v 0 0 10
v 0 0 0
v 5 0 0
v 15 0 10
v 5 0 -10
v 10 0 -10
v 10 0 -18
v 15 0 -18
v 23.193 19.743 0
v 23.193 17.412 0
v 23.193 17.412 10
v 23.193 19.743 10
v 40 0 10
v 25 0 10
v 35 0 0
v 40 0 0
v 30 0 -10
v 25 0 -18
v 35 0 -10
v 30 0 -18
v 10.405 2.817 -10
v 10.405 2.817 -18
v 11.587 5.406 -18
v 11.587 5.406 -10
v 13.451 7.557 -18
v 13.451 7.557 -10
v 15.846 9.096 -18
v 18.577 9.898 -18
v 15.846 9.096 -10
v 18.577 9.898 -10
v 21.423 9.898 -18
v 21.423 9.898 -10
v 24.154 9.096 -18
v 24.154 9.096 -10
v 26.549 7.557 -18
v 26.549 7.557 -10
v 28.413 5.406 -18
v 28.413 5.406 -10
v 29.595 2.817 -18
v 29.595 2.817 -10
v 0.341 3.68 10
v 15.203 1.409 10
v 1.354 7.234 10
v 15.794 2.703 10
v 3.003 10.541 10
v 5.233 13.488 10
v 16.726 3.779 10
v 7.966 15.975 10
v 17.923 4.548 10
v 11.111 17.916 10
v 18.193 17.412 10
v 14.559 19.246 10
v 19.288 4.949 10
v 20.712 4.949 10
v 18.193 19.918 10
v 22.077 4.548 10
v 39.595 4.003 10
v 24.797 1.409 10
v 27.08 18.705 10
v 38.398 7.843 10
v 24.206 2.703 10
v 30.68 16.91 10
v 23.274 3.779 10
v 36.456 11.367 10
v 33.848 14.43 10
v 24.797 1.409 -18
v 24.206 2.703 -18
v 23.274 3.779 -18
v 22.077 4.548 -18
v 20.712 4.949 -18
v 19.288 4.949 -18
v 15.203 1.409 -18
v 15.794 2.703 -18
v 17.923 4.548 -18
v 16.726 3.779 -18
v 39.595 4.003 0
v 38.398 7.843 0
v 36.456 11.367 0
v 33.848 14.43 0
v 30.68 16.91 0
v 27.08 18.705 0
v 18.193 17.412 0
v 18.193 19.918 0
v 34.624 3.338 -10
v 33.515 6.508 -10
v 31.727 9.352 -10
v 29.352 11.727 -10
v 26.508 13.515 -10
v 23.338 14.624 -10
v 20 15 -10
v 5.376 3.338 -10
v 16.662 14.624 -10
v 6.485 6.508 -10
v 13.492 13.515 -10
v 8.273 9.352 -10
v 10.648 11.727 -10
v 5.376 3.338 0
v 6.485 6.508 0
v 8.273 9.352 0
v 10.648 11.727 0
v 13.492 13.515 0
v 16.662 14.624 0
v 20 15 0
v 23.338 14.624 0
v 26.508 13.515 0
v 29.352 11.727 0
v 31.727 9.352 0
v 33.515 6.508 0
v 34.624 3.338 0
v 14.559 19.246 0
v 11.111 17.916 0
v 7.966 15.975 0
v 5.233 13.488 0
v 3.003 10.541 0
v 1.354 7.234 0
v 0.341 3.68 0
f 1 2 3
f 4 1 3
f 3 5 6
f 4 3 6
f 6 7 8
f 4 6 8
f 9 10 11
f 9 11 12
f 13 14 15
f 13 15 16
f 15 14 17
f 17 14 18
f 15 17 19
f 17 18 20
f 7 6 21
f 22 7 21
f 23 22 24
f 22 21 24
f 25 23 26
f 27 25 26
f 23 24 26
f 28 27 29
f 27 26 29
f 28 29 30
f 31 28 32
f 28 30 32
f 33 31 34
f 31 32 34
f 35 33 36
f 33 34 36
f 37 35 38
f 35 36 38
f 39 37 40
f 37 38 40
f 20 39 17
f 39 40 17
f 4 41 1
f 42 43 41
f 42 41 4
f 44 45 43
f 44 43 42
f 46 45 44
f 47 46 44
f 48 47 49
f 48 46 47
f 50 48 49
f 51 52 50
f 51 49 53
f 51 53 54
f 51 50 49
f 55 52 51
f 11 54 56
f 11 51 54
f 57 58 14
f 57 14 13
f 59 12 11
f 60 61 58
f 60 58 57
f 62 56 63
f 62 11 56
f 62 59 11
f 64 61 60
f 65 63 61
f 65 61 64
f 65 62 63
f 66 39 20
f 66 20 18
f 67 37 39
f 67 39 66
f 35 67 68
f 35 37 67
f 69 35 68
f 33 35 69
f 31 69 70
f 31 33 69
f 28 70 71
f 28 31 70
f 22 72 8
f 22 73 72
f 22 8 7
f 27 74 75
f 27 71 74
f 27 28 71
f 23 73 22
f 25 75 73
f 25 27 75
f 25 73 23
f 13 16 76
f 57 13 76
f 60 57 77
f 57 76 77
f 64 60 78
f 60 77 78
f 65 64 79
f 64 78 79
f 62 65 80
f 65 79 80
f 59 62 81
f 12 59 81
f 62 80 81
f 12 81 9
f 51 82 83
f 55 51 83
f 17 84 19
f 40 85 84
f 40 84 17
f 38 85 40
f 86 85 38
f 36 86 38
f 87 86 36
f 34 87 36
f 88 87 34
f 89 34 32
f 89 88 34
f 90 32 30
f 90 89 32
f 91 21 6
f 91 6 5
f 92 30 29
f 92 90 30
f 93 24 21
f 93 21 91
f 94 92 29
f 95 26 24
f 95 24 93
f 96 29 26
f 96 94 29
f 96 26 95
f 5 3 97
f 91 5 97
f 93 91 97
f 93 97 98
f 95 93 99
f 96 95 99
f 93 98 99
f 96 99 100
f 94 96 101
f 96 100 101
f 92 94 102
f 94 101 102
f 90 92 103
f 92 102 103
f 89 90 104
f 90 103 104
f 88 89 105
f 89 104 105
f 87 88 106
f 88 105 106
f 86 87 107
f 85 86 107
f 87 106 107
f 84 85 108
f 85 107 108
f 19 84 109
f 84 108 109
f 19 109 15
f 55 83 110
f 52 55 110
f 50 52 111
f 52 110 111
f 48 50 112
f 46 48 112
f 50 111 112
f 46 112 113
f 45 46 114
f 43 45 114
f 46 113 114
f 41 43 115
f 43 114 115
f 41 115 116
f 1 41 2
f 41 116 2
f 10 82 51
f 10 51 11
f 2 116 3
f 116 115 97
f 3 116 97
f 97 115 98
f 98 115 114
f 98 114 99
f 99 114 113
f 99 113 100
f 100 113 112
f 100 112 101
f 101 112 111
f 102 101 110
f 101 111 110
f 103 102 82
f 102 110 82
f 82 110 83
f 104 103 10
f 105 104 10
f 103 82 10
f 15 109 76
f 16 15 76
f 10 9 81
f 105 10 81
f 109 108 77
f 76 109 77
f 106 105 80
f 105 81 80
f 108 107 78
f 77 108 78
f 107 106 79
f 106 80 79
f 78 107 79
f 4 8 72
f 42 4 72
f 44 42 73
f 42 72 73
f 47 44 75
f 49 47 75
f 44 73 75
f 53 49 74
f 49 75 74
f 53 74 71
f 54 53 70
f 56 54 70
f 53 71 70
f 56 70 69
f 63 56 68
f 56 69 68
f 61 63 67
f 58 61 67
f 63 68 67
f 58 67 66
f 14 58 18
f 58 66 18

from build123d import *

# Parameters (mm, degrees)
BOSS_EXTRUDE1_DEPTH     = 10
CUT_EXTRUDE1_DEPTH      = 12
CUT_EXTRUDE1_DEPTH_BACK = 19
SKETCH3_W               = 5
SKETCH3_H               = 4.533190639
BOSS_EXTRUDE2_DEPTH     = 10
BOSS_EXTRUDE3_DEPTH     = 8
CUT_EXTRUDE3_DEPTH      = 41


with BuildPart() as part:
    # Sketch2 → Boss-Extrude1 (new body)
    with BuildSketch(Plane.XY):
        with BuildLine():
            Line((0, 0), (40, 0))
            ThreePointArc((40, 0), (20, 20), (0, 0))
        make_face()
    extrude(amount=BOSS_EXTRUDE1_DEPTH)

    # Sketch3 → Cut-Extrude1 (cut, two sides: drawn at the far end of the back side and taken through both)
    with BuildSketch(Plane.XY.offset(10).offset(-CUT_EXTRUDE1_DEPTH_BACK)):
        with Locations((20.692849678, 19.678974606)):
            Rectangle(SKETCH3_W, SKETCH3_H)
    extrude(amount=CUT_EXTRUDE1_DEPTH + CUT_EXTRUDE1_DEPTH_BACK, mode=Mode.SUBTRACT)

    # Sketch4 → Boss-Extrude2 (add)
    with BuildSketch(Plane(origin=(0, 0, 0), x_dir=(-1, 0, 0), z_dir=(0, 0, -1))):
        with BuildLine():
            Line((-35, 0), (-5, 0))
            ThreePointArc((-5, 0), (-20, 15), (-35, 0))
        make_face()
    extrude(amount=BOSS_EXTRUDE2_DEPTH)

    # Sketch5 → Boss-Extrude3 (add)
    with BuildSketch(Plane(origin=(0, 0, -10), x_dir=(-1, 0, 0), z_dir=(0, 0, -1))):
        with BuildLine():
            Line((-30, 0), (-10, 0))
            ThreePointArc((-10, 0), (-20, 10), (-30, 0))
        make_face()
    extrude(amount=BOSS_EXTRUDE3_DEPTH)

    # Sketch6 → Cut-Extrude3 (cut)
    with BuildSketch(Plane(origin=(0, 0, -18), x_dir=(-1, 0, 0), z_dir=(0, 0, -1))):
        with BuildLine():
            Line((-25, 0), (-15, 0))
            ThreePointArc((-15, 0), (-20, 5), (-25, 0))
        make_face()
    extrude(amount=-CUT_EXTRUDE3_DEPTH, mode=Mode.SUBTRACT)


solid = part.part
